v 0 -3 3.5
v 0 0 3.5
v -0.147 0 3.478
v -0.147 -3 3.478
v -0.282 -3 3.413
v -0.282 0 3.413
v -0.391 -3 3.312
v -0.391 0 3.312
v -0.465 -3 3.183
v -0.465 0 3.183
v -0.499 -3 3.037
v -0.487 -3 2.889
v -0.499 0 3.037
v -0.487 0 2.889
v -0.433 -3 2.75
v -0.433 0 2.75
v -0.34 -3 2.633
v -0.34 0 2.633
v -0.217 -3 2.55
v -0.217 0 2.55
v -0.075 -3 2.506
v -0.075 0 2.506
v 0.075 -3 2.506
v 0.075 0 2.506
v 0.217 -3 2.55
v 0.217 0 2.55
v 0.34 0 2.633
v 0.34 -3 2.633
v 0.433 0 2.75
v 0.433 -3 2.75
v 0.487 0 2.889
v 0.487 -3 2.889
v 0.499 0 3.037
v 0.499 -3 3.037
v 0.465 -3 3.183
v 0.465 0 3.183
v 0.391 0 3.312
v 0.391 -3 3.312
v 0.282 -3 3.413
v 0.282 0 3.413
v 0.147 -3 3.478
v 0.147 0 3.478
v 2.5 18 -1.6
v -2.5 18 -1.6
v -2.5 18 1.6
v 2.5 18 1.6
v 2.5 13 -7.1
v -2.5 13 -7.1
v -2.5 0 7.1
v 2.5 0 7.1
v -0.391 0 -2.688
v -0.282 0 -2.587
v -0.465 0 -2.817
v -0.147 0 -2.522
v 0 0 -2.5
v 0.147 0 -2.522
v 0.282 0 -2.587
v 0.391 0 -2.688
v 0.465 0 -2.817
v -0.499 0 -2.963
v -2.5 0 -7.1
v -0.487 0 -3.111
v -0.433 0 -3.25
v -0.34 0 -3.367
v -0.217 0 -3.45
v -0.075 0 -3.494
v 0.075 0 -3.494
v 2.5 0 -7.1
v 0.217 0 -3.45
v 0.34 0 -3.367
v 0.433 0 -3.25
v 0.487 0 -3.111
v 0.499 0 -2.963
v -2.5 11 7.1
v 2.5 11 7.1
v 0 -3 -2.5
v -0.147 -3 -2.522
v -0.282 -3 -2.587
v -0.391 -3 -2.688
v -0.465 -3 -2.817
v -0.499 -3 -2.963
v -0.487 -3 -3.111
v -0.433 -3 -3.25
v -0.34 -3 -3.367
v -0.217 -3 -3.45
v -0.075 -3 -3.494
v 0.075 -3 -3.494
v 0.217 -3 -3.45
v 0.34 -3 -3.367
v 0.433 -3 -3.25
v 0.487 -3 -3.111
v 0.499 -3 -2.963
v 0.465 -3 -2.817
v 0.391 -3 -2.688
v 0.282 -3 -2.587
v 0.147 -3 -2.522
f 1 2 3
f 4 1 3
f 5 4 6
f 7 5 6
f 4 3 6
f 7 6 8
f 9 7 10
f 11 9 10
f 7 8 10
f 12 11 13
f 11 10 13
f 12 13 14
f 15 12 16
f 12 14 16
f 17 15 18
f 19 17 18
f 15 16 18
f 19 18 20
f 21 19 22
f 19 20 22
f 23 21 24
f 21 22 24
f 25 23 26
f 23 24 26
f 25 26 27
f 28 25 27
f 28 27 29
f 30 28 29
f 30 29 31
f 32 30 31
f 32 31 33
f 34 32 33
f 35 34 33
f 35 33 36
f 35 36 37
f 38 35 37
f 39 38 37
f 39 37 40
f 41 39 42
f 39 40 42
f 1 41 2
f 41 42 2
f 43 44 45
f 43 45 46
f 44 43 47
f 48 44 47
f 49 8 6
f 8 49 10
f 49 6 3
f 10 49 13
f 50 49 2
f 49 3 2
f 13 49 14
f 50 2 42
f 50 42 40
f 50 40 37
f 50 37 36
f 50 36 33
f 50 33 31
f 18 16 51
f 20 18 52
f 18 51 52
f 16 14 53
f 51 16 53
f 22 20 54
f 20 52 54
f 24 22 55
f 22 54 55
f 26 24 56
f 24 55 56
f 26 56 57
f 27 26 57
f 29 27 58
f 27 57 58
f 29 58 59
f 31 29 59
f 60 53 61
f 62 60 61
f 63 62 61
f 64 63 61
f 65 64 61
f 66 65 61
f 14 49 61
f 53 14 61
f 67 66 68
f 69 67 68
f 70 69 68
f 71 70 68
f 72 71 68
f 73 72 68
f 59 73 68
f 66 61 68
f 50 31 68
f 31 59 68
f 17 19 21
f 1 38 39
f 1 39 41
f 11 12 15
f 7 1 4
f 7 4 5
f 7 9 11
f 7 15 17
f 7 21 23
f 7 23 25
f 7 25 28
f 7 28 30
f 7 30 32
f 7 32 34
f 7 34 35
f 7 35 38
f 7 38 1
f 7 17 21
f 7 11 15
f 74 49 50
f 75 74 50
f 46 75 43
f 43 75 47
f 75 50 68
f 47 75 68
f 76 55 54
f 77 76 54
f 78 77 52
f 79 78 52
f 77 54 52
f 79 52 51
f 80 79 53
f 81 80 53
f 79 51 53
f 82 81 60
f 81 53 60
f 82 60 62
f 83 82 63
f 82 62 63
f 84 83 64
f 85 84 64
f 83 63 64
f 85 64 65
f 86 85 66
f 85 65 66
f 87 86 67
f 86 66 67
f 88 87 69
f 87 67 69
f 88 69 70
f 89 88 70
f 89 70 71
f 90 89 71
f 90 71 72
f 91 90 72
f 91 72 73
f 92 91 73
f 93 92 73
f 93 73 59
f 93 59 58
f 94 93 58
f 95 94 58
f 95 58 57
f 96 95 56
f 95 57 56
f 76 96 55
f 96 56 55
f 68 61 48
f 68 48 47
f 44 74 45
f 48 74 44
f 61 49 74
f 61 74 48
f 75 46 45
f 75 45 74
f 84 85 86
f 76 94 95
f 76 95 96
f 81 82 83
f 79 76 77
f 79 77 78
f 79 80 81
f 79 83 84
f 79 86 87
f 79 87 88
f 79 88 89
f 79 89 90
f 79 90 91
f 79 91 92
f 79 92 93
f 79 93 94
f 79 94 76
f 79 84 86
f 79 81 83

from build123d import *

# Parameters (mm, degrees)
SKETCH_1_W          = 5
SKETCH_1_H          = 14.2
EXTRUDE_1_DEPTH     = 18
SKETCH_2_R          = 0.5
EXTRUDE_2_DEPTH     = 3
CUT_EXTRUDE_1_DEPTH = 5


with BuildPart() as part:
    # 草图1 → 拉伸1 (new body)
    with BuildSketch(Plane(origin=(0, 0, 0), x_dir=(1, 0, 0), z_dir=(0, 1, 0))):
        Rectangle(SKETCH_1_W, SKETCH_1_H)
    extrude(amount=EXTRUDE_1_DEPTH)

    # 草图2 → 拉伸2 (add)
    with BuildSketch(Plane.XZ):
        with Locations(Location((0, 3, 0), (0, 0, 90))):
            Circle(SKETCH_2_R)
        with Locations(Location((0, -3, 0), (0, 0, 90))):
            Circle(SKETCH_2_R)
    extrude(amount=EXTRUDE_2_DEPTH)

    # 草图3 → 切除-拉伸1 (cut)
    with BuildSketch(Plane(origin=(2.5, 0, 0), x_dir=(0, 0, -1), z_dir=(1, 0, 0))):
        Polygon((-1.6, 18), (-7.1, 11), (-7.1, 18), align=None)
        Polygon((1.6, 18), (7.1, 13), (7.1, 18), align=None)
    extrude(amount=-CUT_EXTRUDE_1_DEPTH, mode=Mode.SUBTRACT)


solid = part.part
